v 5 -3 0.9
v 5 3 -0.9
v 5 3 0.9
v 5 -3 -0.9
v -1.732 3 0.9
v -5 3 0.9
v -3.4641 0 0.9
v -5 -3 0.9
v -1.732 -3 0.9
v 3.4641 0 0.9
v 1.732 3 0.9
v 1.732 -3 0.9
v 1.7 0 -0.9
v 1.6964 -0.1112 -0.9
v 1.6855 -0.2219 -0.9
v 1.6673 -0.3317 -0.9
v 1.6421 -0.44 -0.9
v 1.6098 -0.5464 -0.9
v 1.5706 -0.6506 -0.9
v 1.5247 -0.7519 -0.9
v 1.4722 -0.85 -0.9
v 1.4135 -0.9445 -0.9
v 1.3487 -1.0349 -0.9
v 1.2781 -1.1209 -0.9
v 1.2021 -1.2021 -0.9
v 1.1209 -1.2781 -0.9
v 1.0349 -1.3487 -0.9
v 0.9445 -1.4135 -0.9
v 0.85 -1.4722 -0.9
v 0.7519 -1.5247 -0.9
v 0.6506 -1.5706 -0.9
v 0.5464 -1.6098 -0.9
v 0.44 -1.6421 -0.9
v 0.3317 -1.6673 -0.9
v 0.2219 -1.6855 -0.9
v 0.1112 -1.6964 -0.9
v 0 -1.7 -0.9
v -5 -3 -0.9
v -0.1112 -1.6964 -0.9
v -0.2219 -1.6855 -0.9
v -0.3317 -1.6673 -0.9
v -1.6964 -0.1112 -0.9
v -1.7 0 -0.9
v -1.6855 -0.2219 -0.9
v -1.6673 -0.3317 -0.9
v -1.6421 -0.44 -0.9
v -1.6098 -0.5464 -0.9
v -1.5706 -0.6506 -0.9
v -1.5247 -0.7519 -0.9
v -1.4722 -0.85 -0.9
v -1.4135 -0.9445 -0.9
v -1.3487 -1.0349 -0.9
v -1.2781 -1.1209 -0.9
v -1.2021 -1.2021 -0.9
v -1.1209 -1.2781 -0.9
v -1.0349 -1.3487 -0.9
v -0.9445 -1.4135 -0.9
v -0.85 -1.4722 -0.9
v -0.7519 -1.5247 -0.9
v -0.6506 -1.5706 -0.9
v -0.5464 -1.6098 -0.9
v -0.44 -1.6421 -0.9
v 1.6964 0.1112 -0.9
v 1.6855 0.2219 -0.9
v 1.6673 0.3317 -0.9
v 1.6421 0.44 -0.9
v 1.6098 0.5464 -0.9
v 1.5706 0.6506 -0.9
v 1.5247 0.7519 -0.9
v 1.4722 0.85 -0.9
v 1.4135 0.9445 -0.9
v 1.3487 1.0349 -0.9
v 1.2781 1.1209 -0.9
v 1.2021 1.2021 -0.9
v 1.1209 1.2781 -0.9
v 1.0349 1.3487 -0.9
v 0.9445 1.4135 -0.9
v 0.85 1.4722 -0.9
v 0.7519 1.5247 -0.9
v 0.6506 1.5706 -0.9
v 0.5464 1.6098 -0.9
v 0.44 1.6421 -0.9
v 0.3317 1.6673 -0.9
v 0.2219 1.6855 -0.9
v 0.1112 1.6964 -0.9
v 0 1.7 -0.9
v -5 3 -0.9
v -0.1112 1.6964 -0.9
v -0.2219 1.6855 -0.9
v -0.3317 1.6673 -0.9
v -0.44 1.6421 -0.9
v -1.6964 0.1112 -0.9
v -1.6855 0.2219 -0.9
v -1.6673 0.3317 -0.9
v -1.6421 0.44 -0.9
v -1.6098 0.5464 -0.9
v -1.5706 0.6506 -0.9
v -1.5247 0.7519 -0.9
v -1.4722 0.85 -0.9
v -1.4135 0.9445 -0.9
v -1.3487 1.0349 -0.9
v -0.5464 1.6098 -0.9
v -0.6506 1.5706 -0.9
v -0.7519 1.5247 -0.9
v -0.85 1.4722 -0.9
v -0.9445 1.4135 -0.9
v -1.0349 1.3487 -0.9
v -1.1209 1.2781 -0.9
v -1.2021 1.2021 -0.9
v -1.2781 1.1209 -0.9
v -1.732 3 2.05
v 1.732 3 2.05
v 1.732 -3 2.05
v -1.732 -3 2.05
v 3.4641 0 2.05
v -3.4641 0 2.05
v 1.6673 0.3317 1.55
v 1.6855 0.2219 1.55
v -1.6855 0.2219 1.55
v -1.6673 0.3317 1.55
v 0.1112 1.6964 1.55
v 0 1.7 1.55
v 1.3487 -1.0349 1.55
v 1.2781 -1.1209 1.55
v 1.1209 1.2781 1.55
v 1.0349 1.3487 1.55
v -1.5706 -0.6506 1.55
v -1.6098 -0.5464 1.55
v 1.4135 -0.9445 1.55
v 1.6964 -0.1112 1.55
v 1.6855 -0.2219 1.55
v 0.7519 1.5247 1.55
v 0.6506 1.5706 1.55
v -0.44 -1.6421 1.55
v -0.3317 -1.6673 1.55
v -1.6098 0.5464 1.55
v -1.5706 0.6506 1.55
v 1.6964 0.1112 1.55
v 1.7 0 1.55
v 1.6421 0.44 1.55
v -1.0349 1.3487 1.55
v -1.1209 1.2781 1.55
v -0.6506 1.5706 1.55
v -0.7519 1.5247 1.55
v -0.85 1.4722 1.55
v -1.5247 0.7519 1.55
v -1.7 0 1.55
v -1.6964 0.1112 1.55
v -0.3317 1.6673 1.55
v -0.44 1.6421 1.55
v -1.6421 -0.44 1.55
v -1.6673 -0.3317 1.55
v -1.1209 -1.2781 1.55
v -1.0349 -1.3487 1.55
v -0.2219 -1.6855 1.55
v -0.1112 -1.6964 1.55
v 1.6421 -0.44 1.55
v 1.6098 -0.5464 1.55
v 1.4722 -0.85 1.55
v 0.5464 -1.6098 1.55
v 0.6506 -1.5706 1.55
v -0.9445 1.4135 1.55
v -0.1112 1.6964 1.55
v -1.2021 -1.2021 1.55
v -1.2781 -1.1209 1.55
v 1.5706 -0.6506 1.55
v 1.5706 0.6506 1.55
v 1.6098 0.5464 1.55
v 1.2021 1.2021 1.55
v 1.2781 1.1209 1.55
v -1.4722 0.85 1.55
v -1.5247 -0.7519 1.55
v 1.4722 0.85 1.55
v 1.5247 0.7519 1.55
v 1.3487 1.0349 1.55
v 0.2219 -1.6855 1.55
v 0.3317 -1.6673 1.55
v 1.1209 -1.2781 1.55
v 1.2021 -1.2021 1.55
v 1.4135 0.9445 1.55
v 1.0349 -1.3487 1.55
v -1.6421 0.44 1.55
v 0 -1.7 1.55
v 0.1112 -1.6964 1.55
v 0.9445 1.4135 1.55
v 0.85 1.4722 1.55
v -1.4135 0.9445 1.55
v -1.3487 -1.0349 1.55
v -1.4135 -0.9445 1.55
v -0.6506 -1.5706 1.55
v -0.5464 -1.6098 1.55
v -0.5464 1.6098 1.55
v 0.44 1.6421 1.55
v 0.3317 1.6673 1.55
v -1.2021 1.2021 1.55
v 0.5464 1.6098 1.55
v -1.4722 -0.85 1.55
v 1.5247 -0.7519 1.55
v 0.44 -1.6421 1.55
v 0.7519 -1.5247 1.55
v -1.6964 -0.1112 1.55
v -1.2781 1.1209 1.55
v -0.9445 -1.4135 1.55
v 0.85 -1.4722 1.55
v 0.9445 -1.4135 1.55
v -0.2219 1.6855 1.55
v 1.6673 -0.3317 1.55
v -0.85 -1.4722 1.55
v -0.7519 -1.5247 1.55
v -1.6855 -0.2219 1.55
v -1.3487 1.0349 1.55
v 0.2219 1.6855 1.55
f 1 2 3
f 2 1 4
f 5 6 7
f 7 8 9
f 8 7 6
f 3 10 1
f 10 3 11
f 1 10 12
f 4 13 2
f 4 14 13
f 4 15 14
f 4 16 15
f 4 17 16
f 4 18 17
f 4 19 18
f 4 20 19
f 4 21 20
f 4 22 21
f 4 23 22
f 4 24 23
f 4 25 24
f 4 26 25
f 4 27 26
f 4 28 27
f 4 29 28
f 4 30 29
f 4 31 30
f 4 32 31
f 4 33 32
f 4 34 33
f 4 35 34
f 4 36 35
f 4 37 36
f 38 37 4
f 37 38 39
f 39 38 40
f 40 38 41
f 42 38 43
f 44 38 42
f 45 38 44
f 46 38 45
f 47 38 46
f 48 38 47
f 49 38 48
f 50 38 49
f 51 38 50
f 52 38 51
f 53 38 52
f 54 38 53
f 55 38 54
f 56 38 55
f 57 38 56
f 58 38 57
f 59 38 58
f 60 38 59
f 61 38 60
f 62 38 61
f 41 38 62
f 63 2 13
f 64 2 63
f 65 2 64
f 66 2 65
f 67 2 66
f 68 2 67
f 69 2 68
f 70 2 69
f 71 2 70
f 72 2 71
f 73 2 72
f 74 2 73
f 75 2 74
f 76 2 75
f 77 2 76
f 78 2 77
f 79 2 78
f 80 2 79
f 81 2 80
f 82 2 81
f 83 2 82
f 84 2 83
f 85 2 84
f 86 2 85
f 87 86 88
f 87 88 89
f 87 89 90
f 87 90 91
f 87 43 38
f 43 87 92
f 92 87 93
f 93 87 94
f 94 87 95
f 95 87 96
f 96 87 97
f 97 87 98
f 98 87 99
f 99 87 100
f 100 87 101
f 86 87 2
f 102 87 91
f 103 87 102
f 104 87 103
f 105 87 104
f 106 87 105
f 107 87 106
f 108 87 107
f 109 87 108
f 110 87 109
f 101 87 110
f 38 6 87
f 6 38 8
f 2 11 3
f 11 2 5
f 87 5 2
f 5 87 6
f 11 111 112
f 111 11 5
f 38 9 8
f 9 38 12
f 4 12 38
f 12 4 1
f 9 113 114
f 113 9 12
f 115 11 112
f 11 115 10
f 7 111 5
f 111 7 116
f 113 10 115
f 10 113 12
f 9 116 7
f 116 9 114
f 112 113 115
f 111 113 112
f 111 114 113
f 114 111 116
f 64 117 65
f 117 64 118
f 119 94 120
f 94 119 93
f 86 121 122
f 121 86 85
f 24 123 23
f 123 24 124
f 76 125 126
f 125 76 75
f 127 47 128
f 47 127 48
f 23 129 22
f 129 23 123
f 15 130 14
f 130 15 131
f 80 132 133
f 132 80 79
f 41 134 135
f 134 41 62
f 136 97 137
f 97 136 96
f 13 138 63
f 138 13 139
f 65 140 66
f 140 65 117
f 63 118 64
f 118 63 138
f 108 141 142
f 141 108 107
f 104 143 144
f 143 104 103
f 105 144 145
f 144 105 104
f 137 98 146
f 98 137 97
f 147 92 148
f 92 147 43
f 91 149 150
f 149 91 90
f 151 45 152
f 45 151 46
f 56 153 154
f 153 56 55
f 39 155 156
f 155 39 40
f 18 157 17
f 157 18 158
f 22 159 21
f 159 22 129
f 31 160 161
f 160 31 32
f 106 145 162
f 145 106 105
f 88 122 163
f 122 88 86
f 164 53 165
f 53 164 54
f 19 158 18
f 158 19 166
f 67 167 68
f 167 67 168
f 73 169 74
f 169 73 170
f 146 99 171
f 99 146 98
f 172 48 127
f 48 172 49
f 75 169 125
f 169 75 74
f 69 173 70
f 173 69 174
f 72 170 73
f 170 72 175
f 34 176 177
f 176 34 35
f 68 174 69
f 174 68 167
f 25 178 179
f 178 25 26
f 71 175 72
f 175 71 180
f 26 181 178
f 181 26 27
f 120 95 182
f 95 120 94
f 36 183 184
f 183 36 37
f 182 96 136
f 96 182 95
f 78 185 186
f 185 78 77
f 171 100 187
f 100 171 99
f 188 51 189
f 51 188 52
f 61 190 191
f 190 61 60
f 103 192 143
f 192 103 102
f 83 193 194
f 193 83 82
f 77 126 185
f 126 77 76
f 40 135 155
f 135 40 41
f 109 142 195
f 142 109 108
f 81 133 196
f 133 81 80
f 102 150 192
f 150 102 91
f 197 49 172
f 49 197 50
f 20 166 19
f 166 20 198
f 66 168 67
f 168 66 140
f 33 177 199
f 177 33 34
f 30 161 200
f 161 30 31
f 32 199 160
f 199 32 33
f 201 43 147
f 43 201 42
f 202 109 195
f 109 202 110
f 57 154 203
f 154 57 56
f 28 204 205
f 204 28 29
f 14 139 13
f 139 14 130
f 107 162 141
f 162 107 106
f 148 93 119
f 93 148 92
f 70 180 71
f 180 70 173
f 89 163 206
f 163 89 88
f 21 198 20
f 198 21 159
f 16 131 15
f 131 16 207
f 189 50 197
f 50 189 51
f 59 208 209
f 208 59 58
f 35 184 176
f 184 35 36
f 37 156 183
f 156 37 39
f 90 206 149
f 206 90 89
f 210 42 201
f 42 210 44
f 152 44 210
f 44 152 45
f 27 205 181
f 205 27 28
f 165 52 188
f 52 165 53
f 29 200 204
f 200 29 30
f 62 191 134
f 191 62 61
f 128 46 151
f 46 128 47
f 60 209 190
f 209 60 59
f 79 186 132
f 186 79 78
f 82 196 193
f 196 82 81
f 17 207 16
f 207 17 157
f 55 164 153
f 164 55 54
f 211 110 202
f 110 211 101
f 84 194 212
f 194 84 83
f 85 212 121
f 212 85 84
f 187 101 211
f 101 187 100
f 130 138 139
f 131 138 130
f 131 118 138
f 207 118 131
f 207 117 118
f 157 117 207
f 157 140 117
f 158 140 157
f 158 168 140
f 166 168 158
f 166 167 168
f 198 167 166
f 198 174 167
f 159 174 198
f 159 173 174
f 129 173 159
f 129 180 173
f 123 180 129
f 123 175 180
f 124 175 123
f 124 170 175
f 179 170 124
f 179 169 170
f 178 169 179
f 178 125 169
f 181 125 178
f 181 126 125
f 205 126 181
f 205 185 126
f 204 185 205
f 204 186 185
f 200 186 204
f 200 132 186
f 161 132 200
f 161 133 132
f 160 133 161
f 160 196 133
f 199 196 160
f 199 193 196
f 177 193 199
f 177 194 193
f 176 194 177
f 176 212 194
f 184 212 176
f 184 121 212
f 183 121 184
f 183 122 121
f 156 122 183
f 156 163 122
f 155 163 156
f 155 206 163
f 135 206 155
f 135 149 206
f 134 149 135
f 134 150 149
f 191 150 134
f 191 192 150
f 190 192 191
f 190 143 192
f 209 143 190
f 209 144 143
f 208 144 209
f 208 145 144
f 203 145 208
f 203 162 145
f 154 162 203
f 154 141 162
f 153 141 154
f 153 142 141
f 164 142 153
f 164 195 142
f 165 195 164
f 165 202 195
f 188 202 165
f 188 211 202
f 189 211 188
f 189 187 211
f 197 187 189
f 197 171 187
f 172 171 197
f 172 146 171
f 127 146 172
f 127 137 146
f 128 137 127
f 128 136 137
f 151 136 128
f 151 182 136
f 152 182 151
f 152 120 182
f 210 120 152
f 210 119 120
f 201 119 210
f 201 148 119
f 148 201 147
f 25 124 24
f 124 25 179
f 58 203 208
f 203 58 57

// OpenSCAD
$fn = 96;

// T-slot nut for 3.0mm screws
// Key dimensions to match:
// - 6.0mm across flats (hex boss)
// - 3.0mm thick overall
// - through clearance hole for 3.0mm screw

across_flats = 6.0;
thickness    = 3.0;

screw_d    = 3.0;
clearance  = 0.4;
hole_d     = screw_d + clearance;

// Generic T-slot nut proportions (parametric, connected, verifiable)
nut_len = 10.0;  // along slot
nut_w   = 6.0;   // across slot (kept compact; hex boss defines 6mm AF feature)

boss_h  = 1.2;                 // hex boss height
base_h  = thickness - boss_h;  // base height

eps = 0.05;

module hex_prism_af(af, h){
    R = af / (2 * cos(30));
    linear_extrude(height=h, center=true)
        polygon(points=[for(i=[0:5]) [R*cos(60*i), R*sin(60*i)]]);
}

difference() {
    union() {
        // Base body (centered)
        cube([nut_len, nut_w, base_h], center=true);

        // Hex anti-rotation boss on top, connected with slight overlap
        translate([0, 0, base_h/2 + boss_h/2 - eps])
            hex_prism_af(across_flats, boss_h);
    }

    // Through hole (centered) for 3.0mm screw clearance
    cylinder(d=hole_d, h=thickness + 2*eps, center=true);
}
